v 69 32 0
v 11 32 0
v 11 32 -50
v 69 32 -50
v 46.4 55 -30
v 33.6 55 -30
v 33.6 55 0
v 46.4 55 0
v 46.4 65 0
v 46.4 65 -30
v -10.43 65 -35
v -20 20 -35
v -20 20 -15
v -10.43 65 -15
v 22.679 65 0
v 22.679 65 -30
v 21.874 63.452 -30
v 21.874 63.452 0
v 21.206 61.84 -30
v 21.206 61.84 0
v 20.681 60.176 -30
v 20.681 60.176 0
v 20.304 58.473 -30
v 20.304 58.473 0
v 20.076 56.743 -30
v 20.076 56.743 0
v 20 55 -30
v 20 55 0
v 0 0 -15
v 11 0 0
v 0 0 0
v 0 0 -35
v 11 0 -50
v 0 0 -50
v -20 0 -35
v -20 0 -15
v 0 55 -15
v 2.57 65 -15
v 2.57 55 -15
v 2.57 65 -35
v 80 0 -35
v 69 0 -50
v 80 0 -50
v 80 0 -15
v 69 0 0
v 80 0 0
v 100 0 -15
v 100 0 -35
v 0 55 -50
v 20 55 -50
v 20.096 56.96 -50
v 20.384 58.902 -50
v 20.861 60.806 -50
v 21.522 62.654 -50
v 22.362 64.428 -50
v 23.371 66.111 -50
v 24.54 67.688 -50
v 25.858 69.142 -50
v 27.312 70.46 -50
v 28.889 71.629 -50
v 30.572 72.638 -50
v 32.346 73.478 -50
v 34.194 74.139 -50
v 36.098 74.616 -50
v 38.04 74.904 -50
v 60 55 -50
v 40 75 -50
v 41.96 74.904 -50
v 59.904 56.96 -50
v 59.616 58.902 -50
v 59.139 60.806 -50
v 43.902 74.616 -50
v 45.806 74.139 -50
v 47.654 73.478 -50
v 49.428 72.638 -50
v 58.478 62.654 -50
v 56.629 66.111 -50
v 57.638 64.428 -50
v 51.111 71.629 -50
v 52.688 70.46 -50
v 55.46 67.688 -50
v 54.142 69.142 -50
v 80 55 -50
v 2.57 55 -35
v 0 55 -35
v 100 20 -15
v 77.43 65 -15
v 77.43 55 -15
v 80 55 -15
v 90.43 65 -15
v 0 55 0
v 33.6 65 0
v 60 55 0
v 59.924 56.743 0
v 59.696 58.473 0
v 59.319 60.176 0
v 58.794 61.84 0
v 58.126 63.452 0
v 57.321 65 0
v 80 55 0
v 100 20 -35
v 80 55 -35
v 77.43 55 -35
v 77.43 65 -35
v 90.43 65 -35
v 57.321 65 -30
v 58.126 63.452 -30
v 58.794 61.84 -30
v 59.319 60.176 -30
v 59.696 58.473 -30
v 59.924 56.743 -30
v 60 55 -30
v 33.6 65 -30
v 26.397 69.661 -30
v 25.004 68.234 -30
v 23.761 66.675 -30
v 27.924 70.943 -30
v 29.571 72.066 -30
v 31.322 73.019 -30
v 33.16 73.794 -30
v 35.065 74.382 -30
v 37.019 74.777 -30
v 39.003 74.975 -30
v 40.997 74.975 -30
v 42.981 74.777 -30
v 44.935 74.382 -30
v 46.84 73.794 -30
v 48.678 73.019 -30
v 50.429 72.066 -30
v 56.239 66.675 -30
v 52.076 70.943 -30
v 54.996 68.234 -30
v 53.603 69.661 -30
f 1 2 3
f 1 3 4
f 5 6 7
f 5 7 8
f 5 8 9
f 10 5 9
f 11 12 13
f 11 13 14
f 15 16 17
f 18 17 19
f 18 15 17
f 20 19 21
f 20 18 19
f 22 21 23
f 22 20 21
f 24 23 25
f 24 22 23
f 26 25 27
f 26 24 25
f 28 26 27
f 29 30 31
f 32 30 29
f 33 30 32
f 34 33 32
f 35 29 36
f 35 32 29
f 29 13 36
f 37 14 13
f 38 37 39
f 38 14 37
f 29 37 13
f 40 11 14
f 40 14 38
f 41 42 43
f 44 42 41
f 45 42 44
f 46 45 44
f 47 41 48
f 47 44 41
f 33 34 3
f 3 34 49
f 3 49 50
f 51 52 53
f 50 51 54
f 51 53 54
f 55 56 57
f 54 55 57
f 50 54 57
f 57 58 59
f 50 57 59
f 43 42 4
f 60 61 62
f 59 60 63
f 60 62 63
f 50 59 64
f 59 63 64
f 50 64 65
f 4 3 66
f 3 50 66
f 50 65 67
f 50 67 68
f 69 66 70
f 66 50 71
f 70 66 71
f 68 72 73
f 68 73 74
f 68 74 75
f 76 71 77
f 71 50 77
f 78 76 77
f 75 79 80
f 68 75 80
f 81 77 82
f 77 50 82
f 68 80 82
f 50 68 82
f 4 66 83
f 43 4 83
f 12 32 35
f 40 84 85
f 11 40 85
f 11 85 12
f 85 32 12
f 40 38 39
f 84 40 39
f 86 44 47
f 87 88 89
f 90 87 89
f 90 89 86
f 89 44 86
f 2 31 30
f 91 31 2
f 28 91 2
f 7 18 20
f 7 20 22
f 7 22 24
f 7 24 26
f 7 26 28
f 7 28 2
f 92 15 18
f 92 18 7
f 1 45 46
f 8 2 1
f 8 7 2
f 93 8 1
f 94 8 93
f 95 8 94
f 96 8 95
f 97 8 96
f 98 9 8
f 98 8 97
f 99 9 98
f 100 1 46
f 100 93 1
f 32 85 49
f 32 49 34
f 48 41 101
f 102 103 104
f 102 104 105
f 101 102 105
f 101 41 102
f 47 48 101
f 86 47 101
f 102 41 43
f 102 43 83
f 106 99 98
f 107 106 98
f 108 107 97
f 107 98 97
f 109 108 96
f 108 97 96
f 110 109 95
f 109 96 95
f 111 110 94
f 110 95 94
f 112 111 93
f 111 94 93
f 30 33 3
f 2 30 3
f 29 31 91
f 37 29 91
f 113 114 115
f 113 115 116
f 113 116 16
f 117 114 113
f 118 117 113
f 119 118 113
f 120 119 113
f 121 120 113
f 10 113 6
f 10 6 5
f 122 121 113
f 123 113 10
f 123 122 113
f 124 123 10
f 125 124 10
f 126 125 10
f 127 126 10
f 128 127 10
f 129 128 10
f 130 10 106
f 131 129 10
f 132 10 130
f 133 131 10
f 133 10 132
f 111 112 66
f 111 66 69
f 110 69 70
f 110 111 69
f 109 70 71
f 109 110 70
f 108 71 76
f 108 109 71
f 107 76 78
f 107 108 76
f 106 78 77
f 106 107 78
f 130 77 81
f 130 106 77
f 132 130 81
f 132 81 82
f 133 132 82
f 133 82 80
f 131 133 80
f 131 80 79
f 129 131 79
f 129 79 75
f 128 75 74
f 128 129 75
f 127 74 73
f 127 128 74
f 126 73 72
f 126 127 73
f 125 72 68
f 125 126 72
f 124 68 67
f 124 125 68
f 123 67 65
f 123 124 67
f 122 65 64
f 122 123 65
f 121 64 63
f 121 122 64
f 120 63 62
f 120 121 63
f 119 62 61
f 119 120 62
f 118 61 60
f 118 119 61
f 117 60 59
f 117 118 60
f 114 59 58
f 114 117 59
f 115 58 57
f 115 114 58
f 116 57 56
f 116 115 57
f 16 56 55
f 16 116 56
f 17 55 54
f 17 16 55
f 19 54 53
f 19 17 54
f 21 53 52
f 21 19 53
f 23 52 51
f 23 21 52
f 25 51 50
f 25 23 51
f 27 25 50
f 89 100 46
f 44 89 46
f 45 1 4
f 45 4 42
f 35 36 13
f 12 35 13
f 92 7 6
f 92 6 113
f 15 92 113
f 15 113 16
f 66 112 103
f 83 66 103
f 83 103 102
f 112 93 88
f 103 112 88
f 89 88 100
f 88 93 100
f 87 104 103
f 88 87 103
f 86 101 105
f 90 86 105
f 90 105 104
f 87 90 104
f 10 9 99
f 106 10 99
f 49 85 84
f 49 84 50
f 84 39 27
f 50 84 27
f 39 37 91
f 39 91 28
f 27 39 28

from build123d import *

# Parameters (mm, degrees)
BOSS_EXTRUDE1_DEPTH = 50
BOSS_EXTRUDE2_START = -35
BOSS_EXTRUDE2_DEPTH = 35.000012
CUT_EXTRUDE1_DEPTH  = 15
CUT_EXTRUDE2_DEPTH  = 15
SKETCH6_R           = 20
BOSS_EXTRUDE3_DEPTH = 50
CUT_EXTRUDE4_DEPTH  = 30
BOSS_EXTRUDE4_DEPTH = 30


with BuildPart() as part:
    # Sketch1 → Boss-Extrude1 (new body)
    with BuildSketch(Plane.XY):
        Polygon((0, 0), (11, 0), (11, 32), (69, 32), (69, 0), (80, 0), (80, 55), (0, 55), align=None)
    extrude(amount=-BOSS_EXTRUDE1_DEPTH)

    # Sketch2 → Boss-Extrude2 (add)
    with BuildSketch(Plane.XY.offset(BOSS_EXTRUDE2_START)):
        Polygon((0, 0), (-20, 0), (-20, 20), (-10.43, 65), (2.57, 65), (2.57, 55), (0, 55), align=None)
        Polygon((80, 0), (100, 0), (100, 20), (90.43, 65), (77.43, 65), (77.43, 55), (80, 55), align=None)
    extrude(amount=BOSS_EXTRUDE2_DEPTH)

    # Sketch3 → Cut-Extrude1 (cut)
    with BuildSketch(Plane.XY.offset(1.2e-05)):
        Polygon((0, 0), (0, 55), (2.57, 55), (2.57, 65), (-10.43, 65), (-20, 20), (-20, 0), align=None)
    extrude(amount=-CUT_EXTRUDE1_DEPTH, mode=Mode.SUBTRACT)

    # Sketch4 → Cut-Extrude2 (cut)
    with BuildSketch(Plane.XY):
        Polygon((80, 55), (80, 0), (100, 0), (100, 20), (90.43, 65), (77.43, 65), (77.43, 55), align=None)
    extrude(amount=-CUT_EXTRUDE2_DEPTH, mode=Mode.SUBTRACT)


with BuildPart() as cut_extrude2_kept_piece:
    # of the separate pieces the step leaves, the one the design keeps (cut_extrude2_pieces_kept)
    add(part.part.solids().sort_by_distance((0, 0, -35))[0])

    # Sketch6 → Boss-Extrude3 (add)
    with BuildSketch(Plane.XY):
        with Locations((40, 55)):
            Circle(SKETCH6_R)
    extrude(amount=-BOSS_EXTRUDE3_DEPTH)

    # Sketch8 → Cut-Extrude4 (cut)
    with BuildSketch(Plane.XY):
        with BuildLine():
            Line((20, 55), (60, 55))
            ThreePointArc((60, 55), (40, 75), (20, 55))
        make_face()
    extrude(amount=-CUT_EXTRUDE4_DEPTH, mode=Mode.SUBTRACT)

    # Sketch9 → Boss-Extrude4 (add)
    with BuildSketch(Plane.XY):
        with BuildLine():
            Line((20, 55), (33.6, 55))
            Line((33.6, 55), (33.6, 65))
            Line((33.6, 65), (22.679491924, 65))
            ThreePointArc((22.679491924, 65), (20.681483474, 60.176380902), (20, 55))
        make_face()
        with BuildLine():
            Line((60, 55), (46.4, 55))
            Line((46.4, 55), (46.4, 65))
            Line((46.4, 65), (57.320508076, 65))
            ThreePointArc((57.320508076, 65), (59.318516526, 60.176380902), (60, 55))
        make_face()
    extrude(amount=-BOSS_EXTRUDE4_DEPTH)


solid = cut_extrude2_kept_piece.part
